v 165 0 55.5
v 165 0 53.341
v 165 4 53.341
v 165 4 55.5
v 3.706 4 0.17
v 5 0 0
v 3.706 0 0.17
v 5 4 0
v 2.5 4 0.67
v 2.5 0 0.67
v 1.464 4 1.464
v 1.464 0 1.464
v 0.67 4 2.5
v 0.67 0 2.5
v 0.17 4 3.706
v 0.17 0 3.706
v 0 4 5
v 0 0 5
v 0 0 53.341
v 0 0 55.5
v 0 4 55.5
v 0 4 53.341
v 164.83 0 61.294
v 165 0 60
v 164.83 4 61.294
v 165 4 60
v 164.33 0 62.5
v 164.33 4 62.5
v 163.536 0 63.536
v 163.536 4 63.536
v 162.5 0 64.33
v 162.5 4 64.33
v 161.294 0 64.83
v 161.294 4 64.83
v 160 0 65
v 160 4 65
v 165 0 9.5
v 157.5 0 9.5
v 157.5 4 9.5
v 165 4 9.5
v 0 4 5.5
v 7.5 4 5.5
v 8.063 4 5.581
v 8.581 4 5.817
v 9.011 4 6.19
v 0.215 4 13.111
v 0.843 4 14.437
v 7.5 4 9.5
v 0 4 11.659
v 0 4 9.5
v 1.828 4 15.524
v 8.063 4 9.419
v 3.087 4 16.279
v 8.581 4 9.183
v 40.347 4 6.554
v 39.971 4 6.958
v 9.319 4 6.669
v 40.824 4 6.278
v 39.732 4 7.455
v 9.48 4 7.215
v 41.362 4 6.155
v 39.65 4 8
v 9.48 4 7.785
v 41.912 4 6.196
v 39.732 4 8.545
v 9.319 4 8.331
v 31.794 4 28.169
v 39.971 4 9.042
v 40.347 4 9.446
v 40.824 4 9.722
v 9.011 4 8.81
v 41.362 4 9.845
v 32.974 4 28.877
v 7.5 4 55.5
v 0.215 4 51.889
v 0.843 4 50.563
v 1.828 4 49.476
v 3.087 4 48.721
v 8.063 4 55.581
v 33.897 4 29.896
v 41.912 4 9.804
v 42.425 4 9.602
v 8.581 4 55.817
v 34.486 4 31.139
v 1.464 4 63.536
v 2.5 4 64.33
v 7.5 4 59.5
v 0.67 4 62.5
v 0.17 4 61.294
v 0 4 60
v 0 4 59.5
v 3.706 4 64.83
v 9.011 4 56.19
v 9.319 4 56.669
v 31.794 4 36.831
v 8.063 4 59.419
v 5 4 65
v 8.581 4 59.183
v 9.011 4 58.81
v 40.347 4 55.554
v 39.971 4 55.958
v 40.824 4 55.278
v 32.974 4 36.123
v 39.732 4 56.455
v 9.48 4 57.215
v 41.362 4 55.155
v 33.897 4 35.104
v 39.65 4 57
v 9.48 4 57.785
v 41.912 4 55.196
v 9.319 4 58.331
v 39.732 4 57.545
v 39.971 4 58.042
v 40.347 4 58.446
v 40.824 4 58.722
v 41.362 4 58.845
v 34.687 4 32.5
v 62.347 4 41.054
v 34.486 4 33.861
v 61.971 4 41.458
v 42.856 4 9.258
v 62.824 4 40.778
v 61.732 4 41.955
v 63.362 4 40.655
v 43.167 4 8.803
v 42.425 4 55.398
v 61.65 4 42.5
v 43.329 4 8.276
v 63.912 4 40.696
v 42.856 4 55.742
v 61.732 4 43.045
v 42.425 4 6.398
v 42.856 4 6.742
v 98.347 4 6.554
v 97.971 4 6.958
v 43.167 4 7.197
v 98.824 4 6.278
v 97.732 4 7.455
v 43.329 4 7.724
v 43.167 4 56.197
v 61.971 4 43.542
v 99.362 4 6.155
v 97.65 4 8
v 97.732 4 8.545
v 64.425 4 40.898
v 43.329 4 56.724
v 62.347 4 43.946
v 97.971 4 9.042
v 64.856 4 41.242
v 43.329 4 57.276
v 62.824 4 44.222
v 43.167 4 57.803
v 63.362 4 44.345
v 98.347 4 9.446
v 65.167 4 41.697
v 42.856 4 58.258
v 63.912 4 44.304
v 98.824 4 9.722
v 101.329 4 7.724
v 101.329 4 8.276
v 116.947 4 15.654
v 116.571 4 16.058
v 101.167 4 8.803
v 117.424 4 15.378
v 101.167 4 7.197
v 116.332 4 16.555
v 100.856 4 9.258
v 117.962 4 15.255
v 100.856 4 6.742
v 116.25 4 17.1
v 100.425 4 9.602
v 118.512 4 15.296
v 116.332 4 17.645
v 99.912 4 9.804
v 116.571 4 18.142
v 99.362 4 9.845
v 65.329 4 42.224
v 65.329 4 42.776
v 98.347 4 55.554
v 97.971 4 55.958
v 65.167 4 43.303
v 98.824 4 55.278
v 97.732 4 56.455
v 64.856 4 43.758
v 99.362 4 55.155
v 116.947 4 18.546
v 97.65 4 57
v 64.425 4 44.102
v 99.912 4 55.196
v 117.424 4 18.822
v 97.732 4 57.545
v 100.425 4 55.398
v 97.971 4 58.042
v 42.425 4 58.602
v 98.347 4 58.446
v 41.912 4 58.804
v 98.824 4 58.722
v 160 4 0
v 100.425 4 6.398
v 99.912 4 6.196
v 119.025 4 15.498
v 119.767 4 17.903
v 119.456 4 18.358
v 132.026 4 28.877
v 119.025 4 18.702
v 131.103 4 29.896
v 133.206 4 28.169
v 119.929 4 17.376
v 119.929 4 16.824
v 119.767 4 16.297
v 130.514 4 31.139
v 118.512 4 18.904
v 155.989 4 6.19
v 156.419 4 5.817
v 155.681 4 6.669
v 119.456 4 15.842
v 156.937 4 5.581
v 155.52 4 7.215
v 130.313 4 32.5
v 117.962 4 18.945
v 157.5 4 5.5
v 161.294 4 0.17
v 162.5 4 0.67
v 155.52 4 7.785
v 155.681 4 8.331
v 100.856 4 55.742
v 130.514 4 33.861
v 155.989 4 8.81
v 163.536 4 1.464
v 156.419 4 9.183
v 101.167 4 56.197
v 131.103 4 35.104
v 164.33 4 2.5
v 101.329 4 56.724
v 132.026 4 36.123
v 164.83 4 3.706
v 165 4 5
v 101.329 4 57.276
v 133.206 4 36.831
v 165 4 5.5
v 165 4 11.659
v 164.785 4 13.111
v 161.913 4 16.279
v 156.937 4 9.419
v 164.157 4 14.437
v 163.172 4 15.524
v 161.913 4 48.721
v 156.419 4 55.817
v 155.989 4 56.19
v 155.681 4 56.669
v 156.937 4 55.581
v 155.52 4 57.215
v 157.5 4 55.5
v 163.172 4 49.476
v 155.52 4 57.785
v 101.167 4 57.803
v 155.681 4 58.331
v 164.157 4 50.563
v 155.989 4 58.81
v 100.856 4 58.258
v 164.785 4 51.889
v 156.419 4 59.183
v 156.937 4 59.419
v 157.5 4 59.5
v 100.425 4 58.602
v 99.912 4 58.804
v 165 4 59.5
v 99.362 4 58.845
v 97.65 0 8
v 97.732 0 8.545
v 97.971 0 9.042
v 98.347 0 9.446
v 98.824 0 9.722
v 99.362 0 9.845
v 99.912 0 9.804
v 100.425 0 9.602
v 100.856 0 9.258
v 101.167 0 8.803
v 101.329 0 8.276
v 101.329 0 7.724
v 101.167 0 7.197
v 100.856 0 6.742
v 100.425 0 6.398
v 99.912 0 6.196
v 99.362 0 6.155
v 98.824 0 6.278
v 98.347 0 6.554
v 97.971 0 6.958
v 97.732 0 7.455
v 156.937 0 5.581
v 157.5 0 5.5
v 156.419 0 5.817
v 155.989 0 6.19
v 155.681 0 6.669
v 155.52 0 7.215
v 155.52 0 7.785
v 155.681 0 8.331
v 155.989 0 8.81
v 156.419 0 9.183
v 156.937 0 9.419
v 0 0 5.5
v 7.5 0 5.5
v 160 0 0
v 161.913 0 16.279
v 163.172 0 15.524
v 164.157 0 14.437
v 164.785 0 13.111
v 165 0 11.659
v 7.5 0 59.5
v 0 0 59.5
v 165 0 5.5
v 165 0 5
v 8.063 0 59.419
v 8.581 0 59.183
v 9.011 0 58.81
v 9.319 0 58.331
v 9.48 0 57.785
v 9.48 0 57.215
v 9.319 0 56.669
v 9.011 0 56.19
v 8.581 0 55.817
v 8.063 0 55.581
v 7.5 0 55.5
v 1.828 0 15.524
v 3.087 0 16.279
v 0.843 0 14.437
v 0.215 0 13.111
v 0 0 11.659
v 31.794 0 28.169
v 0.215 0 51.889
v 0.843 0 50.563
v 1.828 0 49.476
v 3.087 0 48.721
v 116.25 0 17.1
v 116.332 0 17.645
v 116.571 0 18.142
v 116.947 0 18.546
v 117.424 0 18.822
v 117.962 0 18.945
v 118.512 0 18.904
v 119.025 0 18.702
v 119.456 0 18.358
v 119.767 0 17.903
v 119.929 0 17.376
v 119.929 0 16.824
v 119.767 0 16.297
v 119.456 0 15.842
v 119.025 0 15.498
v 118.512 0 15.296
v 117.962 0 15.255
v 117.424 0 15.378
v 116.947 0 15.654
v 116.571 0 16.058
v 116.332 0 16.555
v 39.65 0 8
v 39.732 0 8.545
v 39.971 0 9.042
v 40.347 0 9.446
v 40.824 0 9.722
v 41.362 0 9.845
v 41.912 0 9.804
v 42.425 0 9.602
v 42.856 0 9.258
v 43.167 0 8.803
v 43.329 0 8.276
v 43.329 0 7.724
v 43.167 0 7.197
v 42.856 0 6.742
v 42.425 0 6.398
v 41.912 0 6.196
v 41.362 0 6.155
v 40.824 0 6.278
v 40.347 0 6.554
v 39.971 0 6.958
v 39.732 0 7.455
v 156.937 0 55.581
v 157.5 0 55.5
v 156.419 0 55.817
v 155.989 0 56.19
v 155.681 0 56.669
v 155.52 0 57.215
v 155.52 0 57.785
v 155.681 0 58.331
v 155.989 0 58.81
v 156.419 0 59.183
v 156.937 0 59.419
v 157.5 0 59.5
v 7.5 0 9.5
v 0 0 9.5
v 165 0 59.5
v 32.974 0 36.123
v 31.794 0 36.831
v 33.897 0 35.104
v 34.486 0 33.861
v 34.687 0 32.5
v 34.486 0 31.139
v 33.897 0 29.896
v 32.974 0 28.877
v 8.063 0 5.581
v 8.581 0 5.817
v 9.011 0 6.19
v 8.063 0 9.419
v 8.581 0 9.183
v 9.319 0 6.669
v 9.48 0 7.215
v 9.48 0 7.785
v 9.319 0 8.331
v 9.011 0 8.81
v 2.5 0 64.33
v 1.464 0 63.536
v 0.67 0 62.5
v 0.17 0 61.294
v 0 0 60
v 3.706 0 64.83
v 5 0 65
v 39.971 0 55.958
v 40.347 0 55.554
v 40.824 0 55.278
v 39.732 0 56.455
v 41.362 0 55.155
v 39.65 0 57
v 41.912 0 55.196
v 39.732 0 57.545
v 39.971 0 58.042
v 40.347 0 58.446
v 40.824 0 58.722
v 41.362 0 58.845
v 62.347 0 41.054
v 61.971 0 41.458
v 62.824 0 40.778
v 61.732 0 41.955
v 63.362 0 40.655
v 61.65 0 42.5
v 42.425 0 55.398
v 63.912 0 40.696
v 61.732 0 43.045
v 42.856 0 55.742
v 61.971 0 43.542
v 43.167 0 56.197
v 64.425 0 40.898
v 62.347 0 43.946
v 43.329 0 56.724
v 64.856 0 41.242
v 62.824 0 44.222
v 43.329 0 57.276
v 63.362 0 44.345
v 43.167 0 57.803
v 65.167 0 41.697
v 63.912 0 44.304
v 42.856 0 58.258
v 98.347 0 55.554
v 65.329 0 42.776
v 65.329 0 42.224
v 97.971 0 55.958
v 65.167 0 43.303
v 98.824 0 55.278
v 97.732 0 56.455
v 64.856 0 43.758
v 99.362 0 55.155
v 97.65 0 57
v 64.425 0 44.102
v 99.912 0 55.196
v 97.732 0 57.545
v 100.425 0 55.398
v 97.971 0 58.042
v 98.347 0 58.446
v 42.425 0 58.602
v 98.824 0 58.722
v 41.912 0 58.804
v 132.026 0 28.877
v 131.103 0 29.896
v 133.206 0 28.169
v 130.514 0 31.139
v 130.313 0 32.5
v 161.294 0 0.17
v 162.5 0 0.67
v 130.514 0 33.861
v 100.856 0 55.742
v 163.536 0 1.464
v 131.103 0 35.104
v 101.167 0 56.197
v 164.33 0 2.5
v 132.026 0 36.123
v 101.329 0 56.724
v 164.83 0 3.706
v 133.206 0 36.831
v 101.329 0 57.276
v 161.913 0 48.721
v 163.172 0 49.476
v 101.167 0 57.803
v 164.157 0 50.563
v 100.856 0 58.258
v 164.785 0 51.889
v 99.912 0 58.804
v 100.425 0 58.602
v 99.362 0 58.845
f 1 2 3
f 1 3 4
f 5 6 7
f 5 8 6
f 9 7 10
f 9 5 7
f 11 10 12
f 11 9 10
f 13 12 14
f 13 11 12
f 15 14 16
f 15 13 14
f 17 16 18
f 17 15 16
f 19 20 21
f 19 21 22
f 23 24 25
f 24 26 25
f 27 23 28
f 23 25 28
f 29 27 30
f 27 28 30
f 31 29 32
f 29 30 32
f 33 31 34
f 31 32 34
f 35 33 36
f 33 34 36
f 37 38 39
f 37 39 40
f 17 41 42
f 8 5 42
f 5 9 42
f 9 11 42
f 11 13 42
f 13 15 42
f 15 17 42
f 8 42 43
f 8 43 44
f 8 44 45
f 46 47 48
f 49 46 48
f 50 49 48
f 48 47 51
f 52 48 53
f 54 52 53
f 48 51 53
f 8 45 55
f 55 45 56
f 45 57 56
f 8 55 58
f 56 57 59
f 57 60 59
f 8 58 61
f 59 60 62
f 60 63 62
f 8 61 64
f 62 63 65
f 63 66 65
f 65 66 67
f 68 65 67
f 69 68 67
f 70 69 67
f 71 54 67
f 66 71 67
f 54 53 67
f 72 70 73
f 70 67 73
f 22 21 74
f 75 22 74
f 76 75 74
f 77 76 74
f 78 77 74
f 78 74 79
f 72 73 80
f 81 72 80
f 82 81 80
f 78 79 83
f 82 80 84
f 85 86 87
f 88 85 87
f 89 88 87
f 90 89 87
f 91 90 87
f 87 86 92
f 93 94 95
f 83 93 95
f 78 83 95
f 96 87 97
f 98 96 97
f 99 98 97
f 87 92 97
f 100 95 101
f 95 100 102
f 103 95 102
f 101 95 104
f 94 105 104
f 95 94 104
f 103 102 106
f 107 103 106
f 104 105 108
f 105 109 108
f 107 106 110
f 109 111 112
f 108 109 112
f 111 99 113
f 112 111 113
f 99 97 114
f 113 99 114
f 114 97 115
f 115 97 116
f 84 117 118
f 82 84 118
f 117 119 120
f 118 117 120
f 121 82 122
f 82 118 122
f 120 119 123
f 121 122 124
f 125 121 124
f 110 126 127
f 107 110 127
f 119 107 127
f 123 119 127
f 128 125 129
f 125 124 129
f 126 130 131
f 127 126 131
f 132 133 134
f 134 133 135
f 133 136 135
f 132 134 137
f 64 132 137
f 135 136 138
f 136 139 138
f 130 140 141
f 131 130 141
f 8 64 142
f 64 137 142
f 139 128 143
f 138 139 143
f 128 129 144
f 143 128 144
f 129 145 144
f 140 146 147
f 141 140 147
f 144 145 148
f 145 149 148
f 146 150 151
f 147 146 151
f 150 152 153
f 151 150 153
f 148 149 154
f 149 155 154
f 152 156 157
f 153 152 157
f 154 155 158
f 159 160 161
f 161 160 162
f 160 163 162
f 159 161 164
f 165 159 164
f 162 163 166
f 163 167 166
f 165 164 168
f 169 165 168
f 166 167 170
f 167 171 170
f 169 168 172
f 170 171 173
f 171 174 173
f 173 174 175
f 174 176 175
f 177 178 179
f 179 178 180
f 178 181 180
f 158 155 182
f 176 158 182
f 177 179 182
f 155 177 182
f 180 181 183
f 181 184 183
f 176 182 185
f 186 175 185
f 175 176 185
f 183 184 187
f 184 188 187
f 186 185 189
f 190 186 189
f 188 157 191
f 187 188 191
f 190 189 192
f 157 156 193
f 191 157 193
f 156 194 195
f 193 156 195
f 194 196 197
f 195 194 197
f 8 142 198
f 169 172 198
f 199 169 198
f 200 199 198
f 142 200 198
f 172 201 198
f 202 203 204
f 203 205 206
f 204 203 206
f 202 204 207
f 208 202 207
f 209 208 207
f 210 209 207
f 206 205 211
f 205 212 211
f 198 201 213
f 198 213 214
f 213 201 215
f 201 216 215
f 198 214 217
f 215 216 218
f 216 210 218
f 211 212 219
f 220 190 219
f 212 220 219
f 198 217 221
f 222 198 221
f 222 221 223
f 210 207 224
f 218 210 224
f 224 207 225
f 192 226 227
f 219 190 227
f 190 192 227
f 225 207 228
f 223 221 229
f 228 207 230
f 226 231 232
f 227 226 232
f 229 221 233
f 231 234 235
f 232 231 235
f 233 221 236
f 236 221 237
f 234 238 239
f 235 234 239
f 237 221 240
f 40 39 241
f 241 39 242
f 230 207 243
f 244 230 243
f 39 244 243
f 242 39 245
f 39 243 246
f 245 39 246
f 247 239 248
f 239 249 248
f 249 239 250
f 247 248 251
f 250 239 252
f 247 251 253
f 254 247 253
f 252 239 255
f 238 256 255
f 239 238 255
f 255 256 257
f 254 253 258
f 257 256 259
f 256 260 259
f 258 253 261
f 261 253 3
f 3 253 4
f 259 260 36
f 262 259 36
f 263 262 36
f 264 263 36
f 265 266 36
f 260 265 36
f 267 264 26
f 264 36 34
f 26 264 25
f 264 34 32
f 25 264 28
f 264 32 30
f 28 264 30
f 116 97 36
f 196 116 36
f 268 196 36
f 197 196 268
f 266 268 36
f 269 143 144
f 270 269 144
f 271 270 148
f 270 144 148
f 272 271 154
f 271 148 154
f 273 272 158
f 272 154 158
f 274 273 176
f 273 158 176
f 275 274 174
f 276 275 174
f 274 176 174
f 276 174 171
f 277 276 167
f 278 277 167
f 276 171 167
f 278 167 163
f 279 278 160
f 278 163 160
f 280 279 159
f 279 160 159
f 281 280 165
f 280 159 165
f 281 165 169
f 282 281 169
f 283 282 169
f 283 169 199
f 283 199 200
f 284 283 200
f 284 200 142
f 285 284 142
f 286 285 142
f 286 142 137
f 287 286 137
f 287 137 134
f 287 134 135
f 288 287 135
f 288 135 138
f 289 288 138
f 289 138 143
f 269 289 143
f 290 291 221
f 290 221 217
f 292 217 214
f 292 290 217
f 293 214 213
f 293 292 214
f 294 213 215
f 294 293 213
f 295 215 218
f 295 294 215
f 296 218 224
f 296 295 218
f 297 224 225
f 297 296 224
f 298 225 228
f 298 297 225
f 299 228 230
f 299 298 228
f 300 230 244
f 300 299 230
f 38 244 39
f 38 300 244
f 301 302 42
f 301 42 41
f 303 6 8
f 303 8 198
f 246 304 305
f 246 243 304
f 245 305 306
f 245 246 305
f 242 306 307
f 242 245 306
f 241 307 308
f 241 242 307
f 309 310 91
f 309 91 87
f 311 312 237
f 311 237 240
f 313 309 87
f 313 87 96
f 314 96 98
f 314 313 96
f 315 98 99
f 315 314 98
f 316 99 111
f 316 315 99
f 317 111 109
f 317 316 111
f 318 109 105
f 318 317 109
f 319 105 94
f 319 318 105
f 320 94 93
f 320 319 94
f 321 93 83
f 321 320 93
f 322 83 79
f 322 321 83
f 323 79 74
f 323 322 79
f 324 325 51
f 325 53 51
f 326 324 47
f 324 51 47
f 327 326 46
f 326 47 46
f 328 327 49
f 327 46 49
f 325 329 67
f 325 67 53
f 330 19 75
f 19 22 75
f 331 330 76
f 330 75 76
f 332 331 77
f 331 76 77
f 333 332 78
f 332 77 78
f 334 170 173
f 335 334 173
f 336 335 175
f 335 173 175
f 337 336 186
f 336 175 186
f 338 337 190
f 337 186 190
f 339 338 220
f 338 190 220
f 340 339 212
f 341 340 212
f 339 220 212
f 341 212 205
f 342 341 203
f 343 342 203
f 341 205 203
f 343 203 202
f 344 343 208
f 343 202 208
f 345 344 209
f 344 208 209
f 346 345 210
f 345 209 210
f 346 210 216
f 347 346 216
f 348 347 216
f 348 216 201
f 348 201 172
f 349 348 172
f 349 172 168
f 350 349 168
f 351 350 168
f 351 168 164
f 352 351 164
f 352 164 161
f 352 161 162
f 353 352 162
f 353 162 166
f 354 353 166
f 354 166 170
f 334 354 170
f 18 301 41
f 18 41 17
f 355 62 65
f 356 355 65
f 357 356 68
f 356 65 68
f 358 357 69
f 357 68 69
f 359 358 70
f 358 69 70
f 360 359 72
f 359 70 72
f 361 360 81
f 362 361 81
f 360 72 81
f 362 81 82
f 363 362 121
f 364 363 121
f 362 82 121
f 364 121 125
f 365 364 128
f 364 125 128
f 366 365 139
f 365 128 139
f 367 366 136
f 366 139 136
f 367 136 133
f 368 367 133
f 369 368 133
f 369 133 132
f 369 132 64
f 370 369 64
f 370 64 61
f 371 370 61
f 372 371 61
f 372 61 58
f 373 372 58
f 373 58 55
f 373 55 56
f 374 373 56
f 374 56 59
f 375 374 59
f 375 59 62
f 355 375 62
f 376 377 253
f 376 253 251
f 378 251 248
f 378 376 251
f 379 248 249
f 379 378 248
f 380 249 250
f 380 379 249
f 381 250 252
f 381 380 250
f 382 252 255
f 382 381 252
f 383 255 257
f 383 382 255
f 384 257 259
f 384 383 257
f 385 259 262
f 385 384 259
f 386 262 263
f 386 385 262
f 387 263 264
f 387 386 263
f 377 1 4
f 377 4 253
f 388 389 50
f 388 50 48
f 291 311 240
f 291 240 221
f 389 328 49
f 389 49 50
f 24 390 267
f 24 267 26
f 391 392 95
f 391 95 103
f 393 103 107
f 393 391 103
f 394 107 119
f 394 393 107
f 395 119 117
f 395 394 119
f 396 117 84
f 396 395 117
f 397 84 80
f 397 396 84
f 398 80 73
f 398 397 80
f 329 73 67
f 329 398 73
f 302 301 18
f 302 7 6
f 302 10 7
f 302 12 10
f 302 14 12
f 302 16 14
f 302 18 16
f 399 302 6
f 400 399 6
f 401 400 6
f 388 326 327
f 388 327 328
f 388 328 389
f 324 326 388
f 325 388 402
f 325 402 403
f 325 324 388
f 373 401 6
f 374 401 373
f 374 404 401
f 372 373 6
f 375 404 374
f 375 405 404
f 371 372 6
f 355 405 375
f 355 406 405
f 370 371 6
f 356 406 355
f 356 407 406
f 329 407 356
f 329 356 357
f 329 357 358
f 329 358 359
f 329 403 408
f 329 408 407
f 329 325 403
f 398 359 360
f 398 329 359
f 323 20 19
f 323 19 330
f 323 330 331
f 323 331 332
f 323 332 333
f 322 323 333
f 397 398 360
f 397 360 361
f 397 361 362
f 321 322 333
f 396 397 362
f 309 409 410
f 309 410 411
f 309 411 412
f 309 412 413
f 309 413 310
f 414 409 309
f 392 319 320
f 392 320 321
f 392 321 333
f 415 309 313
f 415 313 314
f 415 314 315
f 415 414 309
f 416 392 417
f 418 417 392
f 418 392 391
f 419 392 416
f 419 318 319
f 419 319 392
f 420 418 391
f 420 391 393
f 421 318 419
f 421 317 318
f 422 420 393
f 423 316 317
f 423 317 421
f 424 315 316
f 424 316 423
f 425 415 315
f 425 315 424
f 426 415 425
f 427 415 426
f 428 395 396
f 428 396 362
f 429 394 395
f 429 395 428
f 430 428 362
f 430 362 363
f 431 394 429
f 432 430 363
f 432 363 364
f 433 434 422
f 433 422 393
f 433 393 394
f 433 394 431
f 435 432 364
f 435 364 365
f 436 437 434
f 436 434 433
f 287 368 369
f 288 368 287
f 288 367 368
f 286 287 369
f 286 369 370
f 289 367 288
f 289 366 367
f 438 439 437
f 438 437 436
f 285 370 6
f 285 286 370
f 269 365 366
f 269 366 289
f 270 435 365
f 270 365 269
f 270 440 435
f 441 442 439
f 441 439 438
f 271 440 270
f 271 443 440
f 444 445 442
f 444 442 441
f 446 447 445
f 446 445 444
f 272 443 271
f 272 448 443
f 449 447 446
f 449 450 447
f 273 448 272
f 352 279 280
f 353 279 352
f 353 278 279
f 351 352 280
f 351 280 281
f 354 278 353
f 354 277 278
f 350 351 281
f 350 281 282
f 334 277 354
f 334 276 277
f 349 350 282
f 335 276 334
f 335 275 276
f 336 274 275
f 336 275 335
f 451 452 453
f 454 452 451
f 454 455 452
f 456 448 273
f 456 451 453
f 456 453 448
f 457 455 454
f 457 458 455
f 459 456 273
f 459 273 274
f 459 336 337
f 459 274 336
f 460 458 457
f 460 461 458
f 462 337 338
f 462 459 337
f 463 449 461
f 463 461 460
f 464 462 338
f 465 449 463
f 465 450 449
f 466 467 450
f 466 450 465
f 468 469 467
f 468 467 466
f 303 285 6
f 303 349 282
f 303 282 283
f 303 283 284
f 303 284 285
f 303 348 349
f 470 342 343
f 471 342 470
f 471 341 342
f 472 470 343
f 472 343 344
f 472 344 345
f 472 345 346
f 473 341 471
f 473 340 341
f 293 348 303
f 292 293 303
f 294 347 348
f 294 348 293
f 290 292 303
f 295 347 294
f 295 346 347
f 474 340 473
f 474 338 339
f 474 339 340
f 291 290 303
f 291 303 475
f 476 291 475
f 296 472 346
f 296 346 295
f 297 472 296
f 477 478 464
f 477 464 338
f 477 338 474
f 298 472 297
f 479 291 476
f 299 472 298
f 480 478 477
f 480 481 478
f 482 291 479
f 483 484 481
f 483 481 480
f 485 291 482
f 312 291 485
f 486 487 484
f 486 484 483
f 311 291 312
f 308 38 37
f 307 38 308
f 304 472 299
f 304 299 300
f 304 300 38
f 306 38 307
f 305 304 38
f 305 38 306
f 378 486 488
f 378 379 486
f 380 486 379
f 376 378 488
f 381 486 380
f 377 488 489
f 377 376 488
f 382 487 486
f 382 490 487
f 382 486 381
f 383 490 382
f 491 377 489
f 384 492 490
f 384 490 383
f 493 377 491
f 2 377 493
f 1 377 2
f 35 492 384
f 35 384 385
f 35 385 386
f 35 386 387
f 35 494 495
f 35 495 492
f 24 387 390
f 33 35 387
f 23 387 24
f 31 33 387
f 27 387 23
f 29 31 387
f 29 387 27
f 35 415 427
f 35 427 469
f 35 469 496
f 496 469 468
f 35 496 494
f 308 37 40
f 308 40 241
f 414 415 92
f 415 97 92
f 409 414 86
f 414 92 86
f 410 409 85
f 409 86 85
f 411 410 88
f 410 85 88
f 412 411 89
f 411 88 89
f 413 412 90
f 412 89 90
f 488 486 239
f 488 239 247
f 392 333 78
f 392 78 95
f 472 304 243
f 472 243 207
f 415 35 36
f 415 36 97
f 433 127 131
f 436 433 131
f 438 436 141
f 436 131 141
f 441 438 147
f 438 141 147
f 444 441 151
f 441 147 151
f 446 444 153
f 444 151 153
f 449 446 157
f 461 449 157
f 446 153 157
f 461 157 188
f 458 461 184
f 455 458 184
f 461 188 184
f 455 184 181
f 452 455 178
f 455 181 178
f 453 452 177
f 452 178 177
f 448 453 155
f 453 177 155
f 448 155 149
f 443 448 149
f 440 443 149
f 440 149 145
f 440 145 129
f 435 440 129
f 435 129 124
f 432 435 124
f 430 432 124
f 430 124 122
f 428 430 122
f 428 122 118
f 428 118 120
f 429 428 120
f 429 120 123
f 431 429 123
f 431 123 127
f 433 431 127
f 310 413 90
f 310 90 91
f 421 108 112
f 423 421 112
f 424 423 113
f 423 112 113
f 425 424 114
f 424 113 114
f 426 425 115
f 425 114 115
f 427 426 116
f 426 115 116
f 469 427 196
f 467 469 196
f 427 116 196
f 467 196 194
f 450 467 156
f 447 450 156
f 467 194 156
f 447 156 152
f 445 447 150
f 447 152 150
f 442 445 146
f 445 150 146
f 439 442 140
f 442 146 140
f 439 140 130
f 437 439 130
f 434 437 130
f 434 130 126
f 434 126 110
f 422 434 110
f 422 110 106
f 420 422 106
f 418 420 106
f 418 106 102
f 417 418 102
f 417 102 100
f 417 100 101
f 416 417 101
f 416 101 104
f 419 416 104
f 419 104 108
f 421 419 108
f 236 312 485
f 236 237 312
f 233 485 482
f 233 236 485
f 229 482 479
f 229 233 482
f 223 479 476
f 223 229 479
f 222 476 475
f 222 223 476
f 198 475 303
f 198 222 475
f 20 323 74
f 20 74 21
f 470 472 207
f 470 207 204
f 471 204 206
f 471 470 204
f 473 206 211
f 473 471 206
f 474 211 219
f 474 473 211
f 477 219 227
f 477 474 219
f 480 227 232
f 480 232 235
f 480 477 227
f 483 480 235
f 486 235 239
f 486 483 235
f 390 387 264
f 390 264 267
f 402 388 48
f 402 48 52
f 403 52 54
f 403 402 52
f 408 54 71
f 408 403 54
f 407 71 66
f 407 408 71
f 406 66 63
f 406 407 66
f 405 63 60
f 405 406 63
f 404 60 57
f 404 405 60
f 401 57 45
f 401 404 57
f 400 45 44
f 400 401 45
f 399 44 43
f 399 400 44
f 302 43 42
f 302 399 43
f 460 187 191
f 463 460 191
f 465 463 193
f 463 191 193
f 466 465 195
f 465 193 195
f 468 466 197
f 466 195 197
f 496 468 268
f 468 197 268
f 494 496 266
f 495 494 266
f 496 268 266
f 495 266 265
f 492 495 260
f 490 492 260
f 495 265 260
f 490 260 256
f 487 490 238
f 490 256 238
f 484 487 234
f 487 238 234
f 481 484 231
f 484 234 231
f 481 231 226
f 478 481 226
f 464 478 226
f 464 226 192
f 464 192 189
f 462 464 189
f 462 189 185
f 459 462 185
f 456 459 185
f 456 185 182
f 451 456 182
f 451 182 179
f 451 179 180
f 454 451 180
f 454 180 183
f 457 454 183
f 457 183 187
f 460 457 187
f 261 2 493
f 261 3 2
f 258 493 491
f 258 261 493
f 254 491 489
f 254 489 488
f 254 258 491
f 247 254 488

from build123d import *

# Parameters (mm, degrees)
SALIENTE_EXTRUIR1_DEPTH = 4
CROQUIS3_R              = 1.85
CORTAR_EXTRUIR1_DEPTH   = 5
REDONDEO1_R             = 5


with BuildPart() as part:
    # Croquis2 → Saliente-Extruir1 (new body)
    with BuildSketch(Plane(origin=(0, 0, -2.539999962), x_dir=(-1, 0, 0), z_dir=(0, 1, 0))):
        with BuildLine():
            Line((-157.5, 62.039999962), (-165, 62.039999962))
            Line((-165, 62.039999962), (-165, 67.539999962))
            Line((-165, 67.539999962), (0, 67.539999962))
            Line((0, 67.539999962), (0, 62.039999962))
            Line((0, 62.039999962), (-7.5, 62.039999962))
            ThreePointArc((-7.5, 62.039999962), (-9.5, 60.039999962), (-7.5, 58.039999962))
            Line((-7.5, 58.039999962), (0, 58.039999962))
            Line((0, 58.039999962), (0, 52.539999962))
            Line((0, 52.539999962), (-31.793786053, 39.370582579))
            ThreePointArc((-31.793786053, 39.370582579), (-34.687388848, 35.039999962), (-31.793786053, 30.709417344))
            Line((-31.793786053, 30.709417344), (0, 17.539999962))
            Line((0, 17.539999962), (0, 12.039999962))
            Line((0, 12.039999962), (-7.5, 12.039999962))
            ThreePointArc((-7.5, 12.039999962), (-9.5, 10.039999962), (-7.5, 8.039999962))
            Line((-7.5, 8.039999962), (0, 8.039999962))
            Line((0, 8.039999962), (0, 2.539999962))
            Line((0, 2.539999962), (-165, 2.539999962))
            Line((-165, 2.539999962), (-165, 8.039999962))
            Line((-165, 8.039999962), (-157.5, 8.039999962))
            ThreePointArc((-157.5, 8.039999962), (-155.5, 10.039999962), (-157.5, 12.039999962))
            Line((-157.5, 12.039999962), (-165, 12.039999962))
            Line((-165, 12.039999962), (-165, 17.539999962))
            Line((-165, 17.539999962), (-133.206213947, 30.709417344))
            ThreePointArc((-133.206213947, 30.709417344), (-130.312611152, 35.039999962), (-133.206213947, 39.370582579))
            Line((-133.206213947, 39.370582579), (-165, 52.539999962))
            Line((-165, 52.539999962), (-165, 58.039999962))
            Line((-165, 58.039999962), (-157.5, 58.039999962))
            ThreePointArc((-157.5, 58.039999962), (-155.5, 60.039999962), (-157.5, 62.039999962))
        make_face()
    extrude(amount=SALIENTE_EXTRUIR1_DEPTH)

    # Croquis3 → Cortar-Extruir1 (cut, through all)
    with BuildSketch(Plane(origin=(0, 4, 0), x_dir=(-1, 0, 0), z_dir=(0, 1, 0))):
        with Locations((-99.5, 57)):
            Circle(CROQUIS3_R)
        with Locations((-41.5, 57)):
            Circle(CROQUIS3_R)
        with Locations((-41.5, 8)):
            Circle(CROQUIS3_R)
        with Locations((-99.5, 8)):
            Circle(CROQUIS3_R)
        with Locations((-63.5, 42.5)):
            Circle(CROQUIS3_R)
        with Locations((-118.1, 17.1)):
            Circle(CROQUIS3_R)
    extrude(amount=-CORTAR_EXTRUIR1_DEPTH, mode=Mode.SUBTRACT)

    # Redondeo1
    redondeo1_edges = [part.edges().sort_by_distance(p)[0] for p in [
        (165, 2, 65),
        (0, 2, 65),
        (0, 2, 50),
        (0, 2, 15),
        (0, 2, 0),
        (165, 2, 0),
        (165, 2, 15),
        (165, 2, 50),
    ]]
    fillet(redondeo1_edges, radius=REDONDEO1_R)


solid = part.part
